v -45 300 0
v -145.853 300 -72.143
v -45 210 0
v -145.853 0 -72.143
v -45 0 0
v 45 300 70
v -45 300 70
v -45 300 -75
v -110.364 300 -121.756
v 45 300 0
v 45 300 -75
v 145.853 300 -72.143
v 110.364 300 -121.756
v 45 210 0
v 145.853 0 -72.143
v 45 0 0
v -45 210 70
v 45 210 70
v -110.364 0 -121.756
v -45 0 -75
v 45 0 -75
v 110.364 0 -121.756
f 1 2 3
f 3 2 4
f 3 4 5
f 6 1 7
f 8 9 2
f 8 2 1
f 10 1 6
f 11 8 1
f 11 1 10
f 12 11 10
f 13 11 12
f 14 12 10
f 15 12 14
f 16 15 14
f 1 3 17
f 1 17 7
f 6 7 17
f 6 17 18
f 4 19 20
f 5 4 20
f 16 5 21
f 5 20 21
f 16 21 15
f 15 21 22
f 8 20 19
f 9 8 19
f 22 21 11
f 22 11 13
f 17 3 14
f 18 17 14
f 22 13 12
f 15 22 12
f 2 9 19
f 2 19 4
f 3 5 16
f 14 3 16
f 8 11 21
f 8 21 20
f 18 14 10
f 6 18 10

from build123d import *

# Parameters (mm, degrees)
BOSS_EXTRUDE1_DEPTH = 300
SKETCH3_W           = 90
SKETCH3_H           = 90
BOSS_EXTRUDE2_DEPTH = 70


with BuildPart() as part:
    # Sketch2 → Boss-Extrude1 (new body)
    with BuildSketch(Plane(origin=(0, 0, 0), x_dir=(1, 0, 0), z_dir=(0, 1, 0))):
        Polygon((0, 0), (0, 75), (45, 75), (110.363656587, 121.756282785), (145.853333333, 72.142949451), (45, 0), align=None)
    boss_extrude1 = extrude(amount=BOSS_EXTRUDE1_DEPTH)

    # Mirror1: Boss-Extrude1 across plane
    add(boss_extrude1.mirror(Plane(origin=(0, 0, 0), x_dir=(0, 0, 1), z_dir=(1, 0, 0))))

    # Sketch3 → Boss-Extrude2 (add)
    with BuildSketch(Plane.XY):
        with Locations((0, 255)):
            Rectangle(SKETCH3_W, SKETCH3_H)
    extrude(amount=BOSS_EXTRUDE2_DEPTH)


solid = part.part
